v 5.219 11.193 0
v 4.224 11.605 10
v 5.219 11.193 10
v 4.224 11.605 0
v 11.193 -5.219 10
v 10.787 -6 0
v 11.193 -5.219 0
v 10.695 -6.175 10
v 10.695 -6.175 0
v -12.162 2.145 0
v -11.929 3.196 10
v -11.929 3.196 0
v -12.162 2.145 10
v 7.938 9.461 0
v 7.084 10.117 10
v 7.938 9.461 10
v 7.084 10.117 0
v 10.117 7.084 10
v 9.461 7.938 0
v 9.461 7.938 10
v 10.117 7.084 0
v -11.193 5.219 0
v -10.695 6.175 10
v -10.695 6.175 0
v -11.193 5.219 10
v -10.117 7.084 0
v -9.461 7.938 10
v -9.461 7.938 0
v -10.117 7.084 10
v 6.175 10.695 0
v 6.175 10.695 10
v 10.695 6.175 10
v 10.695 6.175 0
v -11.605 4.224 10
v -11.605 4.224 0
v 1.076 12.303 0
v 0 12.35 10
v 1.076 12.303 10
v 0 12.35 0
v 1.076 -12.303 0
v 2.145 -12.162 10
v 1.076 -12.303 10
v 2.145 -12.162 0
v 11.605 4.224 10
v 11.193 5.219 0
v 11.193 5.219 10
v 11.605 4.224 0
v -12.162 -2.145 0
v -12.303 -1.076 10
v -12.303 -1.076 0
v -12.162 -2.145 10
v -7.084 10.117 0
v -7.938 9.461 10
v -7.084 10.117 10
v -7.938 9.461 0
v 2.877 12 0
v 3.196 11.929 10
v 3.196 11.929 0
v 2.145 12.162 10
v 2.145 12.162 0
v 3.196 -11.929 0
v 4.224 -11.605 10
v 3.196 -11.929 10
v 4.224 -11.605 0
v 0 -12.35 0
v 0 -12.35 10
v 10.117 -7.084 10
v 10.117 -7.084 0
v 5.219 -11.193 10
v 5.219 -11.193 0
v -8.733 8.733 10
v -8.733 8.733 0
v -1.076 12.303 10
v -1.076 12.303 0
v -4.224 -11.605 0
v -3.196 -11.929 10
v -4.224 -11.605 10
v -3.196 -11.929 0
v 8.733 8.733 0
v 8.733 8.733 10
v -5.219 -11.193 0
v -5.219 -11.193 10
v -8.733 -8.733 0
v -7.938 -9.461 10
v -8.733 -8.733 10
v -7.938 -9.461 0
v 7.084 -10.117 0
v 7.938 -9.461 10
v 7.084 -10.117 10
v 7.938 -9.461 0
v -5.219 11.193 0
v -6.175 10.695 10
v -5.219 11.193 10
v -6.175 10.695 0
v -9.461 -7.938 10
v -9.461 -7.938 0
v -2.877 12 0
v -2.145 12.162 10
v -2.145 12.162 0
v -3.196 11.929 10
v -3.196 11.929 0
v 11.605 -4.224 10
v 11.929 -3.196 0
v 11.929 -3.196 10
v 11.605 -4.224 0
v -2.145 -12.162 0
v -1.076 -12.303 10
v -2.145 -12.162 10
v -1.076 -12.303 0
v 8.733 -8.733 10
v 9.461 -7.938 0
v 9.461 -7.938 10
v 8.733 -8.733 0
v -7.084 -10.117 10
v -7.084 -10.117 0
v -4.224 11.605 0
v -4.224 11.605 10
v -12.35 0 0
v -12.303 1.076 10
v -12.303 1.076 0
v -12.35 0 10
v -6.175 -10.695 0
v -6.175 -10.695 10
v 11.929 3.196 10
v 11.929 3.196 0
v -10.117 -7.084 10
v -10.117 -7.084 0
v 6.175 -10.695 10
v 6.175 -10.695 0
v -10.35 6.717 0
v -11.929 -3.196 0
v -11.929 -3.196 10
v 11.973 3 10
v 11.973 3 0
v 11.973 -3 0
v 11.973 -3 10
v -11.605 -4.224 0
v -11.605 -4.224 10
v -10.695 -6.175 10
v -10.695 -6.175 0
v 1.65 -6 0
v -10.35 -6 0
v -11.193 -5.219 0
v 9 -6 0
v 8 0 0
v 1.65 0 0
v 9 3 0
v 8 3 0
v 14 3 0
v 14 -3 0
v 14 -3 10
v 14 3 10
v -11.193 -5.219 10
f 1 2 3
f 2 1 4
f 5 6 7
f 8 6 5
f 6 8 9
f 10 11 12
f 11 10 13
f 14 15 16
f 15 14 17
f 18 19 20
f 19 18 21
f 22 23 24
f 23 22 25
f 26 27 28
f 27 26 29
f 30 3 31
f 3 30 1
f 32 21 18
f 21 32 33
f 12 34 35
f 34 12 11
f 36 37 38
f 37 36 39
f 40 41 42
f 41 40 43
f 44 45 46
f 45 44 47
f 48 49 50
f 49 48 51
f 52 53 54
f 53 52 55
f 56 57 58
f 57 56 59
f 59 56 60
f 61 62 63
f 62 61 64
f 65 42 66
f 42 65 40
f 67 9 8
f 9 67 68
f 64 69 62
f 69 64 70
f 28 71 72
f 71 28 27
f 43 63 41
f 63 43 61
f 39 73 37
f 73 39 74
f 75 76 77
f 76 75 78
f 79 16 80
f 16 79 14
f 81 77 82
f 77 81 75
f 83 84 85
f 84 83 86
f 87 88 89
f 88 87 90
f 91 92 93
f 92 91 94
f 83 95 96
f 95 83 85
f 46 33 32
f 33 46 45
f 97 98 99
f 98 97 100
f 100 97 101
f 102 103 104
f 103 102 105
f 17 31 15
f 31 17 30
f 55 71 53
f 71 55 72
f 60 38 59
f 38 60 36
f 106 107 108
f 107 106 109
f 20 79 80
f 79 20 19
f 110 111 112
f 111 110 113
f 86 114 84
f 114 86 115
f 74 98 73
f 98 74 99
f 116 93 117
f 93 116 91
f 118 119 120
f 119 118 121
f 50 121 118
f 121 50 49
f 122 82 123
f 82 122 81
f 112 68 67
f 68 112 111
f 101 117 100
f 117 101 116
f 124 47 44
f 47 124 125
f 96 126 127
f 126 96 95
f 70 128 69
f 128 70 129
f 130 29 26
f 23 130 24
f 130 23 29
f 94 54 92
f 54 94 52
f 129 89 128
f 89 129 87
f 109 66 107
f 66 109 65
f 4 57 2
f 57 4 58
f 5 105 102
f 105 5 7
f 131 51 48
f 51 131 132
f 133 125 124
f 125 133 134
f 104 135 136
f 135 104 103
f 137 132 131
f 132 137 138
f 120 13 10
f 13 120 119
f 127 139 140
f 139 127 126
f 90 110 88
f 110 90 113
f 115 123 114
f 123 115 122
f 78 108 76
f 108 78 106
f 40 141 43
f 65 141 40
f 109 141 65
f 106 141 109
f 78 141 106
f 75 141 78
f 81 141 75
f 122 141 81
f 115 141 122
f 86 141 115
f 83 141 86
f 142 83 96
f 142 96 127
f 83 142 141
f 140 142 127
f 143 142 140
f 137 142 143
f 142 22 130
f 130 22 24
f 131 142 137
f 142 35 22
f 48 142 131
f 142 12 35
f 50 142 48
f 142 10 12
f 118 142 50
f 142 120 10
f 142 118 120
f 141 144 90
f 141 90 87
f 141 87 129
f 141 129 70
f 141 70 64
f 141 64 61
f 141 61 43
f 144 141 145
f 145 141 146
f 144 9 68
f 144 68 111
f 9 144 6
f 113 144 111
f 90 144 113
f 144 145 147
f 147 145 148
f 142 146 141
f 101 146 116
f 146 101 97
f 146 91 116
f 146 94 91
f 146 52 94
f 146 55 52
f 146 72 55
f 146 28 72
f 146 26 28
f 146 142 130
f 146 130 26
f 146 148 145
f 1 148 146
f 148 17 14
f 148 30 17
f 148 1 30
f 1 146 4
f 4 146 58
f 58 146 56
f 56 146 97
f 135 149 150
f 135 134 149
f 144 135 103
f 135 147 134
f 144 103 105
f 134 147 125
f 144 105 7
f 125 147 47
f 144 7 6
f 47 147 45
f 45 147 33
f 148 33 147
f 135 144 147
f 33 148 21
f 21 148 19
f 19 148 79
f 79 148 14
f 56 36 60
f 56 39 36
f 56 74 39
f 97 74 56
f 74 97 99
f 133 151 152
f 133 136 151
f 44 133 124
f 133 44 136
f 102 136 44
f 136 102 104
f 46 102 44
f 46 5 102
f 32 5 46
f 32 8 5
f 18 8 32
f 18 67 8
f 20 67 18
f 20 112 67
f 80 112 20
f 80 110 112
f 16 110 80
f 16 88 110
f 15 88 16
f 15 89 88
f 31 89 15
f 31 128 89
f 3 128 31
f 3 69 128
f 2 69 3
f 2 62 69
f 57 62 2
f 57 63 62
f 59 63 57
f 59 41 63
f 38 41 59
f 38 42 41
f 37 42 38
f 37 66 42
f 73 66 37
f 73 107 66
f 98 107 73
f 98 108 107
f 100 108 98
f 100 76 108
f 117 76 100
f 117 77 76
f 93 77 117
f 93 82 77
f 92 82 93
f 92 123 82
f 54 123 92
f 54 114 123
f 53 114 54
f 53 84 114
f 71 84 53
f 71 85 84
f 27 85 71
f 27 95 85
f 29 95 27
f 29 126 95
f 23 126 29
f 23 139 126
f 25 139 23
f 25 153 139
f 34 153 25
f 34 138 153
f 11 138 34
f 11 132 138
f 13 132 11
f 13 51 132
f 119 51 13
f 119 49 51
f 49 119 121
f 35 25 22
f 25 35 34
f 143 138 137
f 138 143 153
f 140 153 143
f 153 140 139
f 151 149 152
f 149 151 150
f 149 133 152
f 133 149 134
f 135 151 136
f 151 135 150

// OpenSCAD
// Stand-off clip - a ring that snaps onto a round stand rod, with a separate ring for a
// piece of tubing, joined by a bridge. Printed flat (an extruded 2-D profile): the two rings
// do not touch the bed until they are placed over the rod they are meant to hold. NOVEL part.
//

rod_d   = 12.7;
clearance = 3;
ring_w  = 3;
bridge_w = 6;
height  = 10;

$fn = 72;

inner  = rod_d + 2 * clearance;
outer  = inner + 2 * ring_w;
t      = ring_w;

opening = 10;
bridge_h = 4;

difference() {
    union() {
        ring(outer, inner, t);                 // rod ring
        ring(6, 6 - 2 * t, t, p = 15);          // tubing ring
        translate([8, -3, 0]) cube([bridge_w, 6, height]);   // bridge between them
    }
    translate([-(inner / 2 + 1), -opening / 2 - 1, 0]) rotate([-90, 0, 0])
        cube([opening + 2, 2 * (opening / 2 + 1), height + 2]);              // -X opening in the rod ring
    translate([15 - 6, -opening / 2 - 1, 0]) rotate([-90, 0, 0]) cube([opening + 2, 2 * (opening / 2 + 1), height + 2]);  // +X opening in the tubing ring
}

// Reusable ring: inner diameter inner, wall t, centred (x, y). An opening of size d is cut on the +x side.
module ring(outer, inner, t, x = 0, y = 0, d = 10) {
    $fn = 72;
    w = min(t, d / 2 - 1);                 // keep the wall thicker than half the opening
    difference() {
        cylinder(h = height, d = outer);
        translate([x - (inner / 2 + 1), y, 0]) rotate([-90, 0, 0]) cube([inner + 2 * w, d + 2, height + 2]);
    }
}
